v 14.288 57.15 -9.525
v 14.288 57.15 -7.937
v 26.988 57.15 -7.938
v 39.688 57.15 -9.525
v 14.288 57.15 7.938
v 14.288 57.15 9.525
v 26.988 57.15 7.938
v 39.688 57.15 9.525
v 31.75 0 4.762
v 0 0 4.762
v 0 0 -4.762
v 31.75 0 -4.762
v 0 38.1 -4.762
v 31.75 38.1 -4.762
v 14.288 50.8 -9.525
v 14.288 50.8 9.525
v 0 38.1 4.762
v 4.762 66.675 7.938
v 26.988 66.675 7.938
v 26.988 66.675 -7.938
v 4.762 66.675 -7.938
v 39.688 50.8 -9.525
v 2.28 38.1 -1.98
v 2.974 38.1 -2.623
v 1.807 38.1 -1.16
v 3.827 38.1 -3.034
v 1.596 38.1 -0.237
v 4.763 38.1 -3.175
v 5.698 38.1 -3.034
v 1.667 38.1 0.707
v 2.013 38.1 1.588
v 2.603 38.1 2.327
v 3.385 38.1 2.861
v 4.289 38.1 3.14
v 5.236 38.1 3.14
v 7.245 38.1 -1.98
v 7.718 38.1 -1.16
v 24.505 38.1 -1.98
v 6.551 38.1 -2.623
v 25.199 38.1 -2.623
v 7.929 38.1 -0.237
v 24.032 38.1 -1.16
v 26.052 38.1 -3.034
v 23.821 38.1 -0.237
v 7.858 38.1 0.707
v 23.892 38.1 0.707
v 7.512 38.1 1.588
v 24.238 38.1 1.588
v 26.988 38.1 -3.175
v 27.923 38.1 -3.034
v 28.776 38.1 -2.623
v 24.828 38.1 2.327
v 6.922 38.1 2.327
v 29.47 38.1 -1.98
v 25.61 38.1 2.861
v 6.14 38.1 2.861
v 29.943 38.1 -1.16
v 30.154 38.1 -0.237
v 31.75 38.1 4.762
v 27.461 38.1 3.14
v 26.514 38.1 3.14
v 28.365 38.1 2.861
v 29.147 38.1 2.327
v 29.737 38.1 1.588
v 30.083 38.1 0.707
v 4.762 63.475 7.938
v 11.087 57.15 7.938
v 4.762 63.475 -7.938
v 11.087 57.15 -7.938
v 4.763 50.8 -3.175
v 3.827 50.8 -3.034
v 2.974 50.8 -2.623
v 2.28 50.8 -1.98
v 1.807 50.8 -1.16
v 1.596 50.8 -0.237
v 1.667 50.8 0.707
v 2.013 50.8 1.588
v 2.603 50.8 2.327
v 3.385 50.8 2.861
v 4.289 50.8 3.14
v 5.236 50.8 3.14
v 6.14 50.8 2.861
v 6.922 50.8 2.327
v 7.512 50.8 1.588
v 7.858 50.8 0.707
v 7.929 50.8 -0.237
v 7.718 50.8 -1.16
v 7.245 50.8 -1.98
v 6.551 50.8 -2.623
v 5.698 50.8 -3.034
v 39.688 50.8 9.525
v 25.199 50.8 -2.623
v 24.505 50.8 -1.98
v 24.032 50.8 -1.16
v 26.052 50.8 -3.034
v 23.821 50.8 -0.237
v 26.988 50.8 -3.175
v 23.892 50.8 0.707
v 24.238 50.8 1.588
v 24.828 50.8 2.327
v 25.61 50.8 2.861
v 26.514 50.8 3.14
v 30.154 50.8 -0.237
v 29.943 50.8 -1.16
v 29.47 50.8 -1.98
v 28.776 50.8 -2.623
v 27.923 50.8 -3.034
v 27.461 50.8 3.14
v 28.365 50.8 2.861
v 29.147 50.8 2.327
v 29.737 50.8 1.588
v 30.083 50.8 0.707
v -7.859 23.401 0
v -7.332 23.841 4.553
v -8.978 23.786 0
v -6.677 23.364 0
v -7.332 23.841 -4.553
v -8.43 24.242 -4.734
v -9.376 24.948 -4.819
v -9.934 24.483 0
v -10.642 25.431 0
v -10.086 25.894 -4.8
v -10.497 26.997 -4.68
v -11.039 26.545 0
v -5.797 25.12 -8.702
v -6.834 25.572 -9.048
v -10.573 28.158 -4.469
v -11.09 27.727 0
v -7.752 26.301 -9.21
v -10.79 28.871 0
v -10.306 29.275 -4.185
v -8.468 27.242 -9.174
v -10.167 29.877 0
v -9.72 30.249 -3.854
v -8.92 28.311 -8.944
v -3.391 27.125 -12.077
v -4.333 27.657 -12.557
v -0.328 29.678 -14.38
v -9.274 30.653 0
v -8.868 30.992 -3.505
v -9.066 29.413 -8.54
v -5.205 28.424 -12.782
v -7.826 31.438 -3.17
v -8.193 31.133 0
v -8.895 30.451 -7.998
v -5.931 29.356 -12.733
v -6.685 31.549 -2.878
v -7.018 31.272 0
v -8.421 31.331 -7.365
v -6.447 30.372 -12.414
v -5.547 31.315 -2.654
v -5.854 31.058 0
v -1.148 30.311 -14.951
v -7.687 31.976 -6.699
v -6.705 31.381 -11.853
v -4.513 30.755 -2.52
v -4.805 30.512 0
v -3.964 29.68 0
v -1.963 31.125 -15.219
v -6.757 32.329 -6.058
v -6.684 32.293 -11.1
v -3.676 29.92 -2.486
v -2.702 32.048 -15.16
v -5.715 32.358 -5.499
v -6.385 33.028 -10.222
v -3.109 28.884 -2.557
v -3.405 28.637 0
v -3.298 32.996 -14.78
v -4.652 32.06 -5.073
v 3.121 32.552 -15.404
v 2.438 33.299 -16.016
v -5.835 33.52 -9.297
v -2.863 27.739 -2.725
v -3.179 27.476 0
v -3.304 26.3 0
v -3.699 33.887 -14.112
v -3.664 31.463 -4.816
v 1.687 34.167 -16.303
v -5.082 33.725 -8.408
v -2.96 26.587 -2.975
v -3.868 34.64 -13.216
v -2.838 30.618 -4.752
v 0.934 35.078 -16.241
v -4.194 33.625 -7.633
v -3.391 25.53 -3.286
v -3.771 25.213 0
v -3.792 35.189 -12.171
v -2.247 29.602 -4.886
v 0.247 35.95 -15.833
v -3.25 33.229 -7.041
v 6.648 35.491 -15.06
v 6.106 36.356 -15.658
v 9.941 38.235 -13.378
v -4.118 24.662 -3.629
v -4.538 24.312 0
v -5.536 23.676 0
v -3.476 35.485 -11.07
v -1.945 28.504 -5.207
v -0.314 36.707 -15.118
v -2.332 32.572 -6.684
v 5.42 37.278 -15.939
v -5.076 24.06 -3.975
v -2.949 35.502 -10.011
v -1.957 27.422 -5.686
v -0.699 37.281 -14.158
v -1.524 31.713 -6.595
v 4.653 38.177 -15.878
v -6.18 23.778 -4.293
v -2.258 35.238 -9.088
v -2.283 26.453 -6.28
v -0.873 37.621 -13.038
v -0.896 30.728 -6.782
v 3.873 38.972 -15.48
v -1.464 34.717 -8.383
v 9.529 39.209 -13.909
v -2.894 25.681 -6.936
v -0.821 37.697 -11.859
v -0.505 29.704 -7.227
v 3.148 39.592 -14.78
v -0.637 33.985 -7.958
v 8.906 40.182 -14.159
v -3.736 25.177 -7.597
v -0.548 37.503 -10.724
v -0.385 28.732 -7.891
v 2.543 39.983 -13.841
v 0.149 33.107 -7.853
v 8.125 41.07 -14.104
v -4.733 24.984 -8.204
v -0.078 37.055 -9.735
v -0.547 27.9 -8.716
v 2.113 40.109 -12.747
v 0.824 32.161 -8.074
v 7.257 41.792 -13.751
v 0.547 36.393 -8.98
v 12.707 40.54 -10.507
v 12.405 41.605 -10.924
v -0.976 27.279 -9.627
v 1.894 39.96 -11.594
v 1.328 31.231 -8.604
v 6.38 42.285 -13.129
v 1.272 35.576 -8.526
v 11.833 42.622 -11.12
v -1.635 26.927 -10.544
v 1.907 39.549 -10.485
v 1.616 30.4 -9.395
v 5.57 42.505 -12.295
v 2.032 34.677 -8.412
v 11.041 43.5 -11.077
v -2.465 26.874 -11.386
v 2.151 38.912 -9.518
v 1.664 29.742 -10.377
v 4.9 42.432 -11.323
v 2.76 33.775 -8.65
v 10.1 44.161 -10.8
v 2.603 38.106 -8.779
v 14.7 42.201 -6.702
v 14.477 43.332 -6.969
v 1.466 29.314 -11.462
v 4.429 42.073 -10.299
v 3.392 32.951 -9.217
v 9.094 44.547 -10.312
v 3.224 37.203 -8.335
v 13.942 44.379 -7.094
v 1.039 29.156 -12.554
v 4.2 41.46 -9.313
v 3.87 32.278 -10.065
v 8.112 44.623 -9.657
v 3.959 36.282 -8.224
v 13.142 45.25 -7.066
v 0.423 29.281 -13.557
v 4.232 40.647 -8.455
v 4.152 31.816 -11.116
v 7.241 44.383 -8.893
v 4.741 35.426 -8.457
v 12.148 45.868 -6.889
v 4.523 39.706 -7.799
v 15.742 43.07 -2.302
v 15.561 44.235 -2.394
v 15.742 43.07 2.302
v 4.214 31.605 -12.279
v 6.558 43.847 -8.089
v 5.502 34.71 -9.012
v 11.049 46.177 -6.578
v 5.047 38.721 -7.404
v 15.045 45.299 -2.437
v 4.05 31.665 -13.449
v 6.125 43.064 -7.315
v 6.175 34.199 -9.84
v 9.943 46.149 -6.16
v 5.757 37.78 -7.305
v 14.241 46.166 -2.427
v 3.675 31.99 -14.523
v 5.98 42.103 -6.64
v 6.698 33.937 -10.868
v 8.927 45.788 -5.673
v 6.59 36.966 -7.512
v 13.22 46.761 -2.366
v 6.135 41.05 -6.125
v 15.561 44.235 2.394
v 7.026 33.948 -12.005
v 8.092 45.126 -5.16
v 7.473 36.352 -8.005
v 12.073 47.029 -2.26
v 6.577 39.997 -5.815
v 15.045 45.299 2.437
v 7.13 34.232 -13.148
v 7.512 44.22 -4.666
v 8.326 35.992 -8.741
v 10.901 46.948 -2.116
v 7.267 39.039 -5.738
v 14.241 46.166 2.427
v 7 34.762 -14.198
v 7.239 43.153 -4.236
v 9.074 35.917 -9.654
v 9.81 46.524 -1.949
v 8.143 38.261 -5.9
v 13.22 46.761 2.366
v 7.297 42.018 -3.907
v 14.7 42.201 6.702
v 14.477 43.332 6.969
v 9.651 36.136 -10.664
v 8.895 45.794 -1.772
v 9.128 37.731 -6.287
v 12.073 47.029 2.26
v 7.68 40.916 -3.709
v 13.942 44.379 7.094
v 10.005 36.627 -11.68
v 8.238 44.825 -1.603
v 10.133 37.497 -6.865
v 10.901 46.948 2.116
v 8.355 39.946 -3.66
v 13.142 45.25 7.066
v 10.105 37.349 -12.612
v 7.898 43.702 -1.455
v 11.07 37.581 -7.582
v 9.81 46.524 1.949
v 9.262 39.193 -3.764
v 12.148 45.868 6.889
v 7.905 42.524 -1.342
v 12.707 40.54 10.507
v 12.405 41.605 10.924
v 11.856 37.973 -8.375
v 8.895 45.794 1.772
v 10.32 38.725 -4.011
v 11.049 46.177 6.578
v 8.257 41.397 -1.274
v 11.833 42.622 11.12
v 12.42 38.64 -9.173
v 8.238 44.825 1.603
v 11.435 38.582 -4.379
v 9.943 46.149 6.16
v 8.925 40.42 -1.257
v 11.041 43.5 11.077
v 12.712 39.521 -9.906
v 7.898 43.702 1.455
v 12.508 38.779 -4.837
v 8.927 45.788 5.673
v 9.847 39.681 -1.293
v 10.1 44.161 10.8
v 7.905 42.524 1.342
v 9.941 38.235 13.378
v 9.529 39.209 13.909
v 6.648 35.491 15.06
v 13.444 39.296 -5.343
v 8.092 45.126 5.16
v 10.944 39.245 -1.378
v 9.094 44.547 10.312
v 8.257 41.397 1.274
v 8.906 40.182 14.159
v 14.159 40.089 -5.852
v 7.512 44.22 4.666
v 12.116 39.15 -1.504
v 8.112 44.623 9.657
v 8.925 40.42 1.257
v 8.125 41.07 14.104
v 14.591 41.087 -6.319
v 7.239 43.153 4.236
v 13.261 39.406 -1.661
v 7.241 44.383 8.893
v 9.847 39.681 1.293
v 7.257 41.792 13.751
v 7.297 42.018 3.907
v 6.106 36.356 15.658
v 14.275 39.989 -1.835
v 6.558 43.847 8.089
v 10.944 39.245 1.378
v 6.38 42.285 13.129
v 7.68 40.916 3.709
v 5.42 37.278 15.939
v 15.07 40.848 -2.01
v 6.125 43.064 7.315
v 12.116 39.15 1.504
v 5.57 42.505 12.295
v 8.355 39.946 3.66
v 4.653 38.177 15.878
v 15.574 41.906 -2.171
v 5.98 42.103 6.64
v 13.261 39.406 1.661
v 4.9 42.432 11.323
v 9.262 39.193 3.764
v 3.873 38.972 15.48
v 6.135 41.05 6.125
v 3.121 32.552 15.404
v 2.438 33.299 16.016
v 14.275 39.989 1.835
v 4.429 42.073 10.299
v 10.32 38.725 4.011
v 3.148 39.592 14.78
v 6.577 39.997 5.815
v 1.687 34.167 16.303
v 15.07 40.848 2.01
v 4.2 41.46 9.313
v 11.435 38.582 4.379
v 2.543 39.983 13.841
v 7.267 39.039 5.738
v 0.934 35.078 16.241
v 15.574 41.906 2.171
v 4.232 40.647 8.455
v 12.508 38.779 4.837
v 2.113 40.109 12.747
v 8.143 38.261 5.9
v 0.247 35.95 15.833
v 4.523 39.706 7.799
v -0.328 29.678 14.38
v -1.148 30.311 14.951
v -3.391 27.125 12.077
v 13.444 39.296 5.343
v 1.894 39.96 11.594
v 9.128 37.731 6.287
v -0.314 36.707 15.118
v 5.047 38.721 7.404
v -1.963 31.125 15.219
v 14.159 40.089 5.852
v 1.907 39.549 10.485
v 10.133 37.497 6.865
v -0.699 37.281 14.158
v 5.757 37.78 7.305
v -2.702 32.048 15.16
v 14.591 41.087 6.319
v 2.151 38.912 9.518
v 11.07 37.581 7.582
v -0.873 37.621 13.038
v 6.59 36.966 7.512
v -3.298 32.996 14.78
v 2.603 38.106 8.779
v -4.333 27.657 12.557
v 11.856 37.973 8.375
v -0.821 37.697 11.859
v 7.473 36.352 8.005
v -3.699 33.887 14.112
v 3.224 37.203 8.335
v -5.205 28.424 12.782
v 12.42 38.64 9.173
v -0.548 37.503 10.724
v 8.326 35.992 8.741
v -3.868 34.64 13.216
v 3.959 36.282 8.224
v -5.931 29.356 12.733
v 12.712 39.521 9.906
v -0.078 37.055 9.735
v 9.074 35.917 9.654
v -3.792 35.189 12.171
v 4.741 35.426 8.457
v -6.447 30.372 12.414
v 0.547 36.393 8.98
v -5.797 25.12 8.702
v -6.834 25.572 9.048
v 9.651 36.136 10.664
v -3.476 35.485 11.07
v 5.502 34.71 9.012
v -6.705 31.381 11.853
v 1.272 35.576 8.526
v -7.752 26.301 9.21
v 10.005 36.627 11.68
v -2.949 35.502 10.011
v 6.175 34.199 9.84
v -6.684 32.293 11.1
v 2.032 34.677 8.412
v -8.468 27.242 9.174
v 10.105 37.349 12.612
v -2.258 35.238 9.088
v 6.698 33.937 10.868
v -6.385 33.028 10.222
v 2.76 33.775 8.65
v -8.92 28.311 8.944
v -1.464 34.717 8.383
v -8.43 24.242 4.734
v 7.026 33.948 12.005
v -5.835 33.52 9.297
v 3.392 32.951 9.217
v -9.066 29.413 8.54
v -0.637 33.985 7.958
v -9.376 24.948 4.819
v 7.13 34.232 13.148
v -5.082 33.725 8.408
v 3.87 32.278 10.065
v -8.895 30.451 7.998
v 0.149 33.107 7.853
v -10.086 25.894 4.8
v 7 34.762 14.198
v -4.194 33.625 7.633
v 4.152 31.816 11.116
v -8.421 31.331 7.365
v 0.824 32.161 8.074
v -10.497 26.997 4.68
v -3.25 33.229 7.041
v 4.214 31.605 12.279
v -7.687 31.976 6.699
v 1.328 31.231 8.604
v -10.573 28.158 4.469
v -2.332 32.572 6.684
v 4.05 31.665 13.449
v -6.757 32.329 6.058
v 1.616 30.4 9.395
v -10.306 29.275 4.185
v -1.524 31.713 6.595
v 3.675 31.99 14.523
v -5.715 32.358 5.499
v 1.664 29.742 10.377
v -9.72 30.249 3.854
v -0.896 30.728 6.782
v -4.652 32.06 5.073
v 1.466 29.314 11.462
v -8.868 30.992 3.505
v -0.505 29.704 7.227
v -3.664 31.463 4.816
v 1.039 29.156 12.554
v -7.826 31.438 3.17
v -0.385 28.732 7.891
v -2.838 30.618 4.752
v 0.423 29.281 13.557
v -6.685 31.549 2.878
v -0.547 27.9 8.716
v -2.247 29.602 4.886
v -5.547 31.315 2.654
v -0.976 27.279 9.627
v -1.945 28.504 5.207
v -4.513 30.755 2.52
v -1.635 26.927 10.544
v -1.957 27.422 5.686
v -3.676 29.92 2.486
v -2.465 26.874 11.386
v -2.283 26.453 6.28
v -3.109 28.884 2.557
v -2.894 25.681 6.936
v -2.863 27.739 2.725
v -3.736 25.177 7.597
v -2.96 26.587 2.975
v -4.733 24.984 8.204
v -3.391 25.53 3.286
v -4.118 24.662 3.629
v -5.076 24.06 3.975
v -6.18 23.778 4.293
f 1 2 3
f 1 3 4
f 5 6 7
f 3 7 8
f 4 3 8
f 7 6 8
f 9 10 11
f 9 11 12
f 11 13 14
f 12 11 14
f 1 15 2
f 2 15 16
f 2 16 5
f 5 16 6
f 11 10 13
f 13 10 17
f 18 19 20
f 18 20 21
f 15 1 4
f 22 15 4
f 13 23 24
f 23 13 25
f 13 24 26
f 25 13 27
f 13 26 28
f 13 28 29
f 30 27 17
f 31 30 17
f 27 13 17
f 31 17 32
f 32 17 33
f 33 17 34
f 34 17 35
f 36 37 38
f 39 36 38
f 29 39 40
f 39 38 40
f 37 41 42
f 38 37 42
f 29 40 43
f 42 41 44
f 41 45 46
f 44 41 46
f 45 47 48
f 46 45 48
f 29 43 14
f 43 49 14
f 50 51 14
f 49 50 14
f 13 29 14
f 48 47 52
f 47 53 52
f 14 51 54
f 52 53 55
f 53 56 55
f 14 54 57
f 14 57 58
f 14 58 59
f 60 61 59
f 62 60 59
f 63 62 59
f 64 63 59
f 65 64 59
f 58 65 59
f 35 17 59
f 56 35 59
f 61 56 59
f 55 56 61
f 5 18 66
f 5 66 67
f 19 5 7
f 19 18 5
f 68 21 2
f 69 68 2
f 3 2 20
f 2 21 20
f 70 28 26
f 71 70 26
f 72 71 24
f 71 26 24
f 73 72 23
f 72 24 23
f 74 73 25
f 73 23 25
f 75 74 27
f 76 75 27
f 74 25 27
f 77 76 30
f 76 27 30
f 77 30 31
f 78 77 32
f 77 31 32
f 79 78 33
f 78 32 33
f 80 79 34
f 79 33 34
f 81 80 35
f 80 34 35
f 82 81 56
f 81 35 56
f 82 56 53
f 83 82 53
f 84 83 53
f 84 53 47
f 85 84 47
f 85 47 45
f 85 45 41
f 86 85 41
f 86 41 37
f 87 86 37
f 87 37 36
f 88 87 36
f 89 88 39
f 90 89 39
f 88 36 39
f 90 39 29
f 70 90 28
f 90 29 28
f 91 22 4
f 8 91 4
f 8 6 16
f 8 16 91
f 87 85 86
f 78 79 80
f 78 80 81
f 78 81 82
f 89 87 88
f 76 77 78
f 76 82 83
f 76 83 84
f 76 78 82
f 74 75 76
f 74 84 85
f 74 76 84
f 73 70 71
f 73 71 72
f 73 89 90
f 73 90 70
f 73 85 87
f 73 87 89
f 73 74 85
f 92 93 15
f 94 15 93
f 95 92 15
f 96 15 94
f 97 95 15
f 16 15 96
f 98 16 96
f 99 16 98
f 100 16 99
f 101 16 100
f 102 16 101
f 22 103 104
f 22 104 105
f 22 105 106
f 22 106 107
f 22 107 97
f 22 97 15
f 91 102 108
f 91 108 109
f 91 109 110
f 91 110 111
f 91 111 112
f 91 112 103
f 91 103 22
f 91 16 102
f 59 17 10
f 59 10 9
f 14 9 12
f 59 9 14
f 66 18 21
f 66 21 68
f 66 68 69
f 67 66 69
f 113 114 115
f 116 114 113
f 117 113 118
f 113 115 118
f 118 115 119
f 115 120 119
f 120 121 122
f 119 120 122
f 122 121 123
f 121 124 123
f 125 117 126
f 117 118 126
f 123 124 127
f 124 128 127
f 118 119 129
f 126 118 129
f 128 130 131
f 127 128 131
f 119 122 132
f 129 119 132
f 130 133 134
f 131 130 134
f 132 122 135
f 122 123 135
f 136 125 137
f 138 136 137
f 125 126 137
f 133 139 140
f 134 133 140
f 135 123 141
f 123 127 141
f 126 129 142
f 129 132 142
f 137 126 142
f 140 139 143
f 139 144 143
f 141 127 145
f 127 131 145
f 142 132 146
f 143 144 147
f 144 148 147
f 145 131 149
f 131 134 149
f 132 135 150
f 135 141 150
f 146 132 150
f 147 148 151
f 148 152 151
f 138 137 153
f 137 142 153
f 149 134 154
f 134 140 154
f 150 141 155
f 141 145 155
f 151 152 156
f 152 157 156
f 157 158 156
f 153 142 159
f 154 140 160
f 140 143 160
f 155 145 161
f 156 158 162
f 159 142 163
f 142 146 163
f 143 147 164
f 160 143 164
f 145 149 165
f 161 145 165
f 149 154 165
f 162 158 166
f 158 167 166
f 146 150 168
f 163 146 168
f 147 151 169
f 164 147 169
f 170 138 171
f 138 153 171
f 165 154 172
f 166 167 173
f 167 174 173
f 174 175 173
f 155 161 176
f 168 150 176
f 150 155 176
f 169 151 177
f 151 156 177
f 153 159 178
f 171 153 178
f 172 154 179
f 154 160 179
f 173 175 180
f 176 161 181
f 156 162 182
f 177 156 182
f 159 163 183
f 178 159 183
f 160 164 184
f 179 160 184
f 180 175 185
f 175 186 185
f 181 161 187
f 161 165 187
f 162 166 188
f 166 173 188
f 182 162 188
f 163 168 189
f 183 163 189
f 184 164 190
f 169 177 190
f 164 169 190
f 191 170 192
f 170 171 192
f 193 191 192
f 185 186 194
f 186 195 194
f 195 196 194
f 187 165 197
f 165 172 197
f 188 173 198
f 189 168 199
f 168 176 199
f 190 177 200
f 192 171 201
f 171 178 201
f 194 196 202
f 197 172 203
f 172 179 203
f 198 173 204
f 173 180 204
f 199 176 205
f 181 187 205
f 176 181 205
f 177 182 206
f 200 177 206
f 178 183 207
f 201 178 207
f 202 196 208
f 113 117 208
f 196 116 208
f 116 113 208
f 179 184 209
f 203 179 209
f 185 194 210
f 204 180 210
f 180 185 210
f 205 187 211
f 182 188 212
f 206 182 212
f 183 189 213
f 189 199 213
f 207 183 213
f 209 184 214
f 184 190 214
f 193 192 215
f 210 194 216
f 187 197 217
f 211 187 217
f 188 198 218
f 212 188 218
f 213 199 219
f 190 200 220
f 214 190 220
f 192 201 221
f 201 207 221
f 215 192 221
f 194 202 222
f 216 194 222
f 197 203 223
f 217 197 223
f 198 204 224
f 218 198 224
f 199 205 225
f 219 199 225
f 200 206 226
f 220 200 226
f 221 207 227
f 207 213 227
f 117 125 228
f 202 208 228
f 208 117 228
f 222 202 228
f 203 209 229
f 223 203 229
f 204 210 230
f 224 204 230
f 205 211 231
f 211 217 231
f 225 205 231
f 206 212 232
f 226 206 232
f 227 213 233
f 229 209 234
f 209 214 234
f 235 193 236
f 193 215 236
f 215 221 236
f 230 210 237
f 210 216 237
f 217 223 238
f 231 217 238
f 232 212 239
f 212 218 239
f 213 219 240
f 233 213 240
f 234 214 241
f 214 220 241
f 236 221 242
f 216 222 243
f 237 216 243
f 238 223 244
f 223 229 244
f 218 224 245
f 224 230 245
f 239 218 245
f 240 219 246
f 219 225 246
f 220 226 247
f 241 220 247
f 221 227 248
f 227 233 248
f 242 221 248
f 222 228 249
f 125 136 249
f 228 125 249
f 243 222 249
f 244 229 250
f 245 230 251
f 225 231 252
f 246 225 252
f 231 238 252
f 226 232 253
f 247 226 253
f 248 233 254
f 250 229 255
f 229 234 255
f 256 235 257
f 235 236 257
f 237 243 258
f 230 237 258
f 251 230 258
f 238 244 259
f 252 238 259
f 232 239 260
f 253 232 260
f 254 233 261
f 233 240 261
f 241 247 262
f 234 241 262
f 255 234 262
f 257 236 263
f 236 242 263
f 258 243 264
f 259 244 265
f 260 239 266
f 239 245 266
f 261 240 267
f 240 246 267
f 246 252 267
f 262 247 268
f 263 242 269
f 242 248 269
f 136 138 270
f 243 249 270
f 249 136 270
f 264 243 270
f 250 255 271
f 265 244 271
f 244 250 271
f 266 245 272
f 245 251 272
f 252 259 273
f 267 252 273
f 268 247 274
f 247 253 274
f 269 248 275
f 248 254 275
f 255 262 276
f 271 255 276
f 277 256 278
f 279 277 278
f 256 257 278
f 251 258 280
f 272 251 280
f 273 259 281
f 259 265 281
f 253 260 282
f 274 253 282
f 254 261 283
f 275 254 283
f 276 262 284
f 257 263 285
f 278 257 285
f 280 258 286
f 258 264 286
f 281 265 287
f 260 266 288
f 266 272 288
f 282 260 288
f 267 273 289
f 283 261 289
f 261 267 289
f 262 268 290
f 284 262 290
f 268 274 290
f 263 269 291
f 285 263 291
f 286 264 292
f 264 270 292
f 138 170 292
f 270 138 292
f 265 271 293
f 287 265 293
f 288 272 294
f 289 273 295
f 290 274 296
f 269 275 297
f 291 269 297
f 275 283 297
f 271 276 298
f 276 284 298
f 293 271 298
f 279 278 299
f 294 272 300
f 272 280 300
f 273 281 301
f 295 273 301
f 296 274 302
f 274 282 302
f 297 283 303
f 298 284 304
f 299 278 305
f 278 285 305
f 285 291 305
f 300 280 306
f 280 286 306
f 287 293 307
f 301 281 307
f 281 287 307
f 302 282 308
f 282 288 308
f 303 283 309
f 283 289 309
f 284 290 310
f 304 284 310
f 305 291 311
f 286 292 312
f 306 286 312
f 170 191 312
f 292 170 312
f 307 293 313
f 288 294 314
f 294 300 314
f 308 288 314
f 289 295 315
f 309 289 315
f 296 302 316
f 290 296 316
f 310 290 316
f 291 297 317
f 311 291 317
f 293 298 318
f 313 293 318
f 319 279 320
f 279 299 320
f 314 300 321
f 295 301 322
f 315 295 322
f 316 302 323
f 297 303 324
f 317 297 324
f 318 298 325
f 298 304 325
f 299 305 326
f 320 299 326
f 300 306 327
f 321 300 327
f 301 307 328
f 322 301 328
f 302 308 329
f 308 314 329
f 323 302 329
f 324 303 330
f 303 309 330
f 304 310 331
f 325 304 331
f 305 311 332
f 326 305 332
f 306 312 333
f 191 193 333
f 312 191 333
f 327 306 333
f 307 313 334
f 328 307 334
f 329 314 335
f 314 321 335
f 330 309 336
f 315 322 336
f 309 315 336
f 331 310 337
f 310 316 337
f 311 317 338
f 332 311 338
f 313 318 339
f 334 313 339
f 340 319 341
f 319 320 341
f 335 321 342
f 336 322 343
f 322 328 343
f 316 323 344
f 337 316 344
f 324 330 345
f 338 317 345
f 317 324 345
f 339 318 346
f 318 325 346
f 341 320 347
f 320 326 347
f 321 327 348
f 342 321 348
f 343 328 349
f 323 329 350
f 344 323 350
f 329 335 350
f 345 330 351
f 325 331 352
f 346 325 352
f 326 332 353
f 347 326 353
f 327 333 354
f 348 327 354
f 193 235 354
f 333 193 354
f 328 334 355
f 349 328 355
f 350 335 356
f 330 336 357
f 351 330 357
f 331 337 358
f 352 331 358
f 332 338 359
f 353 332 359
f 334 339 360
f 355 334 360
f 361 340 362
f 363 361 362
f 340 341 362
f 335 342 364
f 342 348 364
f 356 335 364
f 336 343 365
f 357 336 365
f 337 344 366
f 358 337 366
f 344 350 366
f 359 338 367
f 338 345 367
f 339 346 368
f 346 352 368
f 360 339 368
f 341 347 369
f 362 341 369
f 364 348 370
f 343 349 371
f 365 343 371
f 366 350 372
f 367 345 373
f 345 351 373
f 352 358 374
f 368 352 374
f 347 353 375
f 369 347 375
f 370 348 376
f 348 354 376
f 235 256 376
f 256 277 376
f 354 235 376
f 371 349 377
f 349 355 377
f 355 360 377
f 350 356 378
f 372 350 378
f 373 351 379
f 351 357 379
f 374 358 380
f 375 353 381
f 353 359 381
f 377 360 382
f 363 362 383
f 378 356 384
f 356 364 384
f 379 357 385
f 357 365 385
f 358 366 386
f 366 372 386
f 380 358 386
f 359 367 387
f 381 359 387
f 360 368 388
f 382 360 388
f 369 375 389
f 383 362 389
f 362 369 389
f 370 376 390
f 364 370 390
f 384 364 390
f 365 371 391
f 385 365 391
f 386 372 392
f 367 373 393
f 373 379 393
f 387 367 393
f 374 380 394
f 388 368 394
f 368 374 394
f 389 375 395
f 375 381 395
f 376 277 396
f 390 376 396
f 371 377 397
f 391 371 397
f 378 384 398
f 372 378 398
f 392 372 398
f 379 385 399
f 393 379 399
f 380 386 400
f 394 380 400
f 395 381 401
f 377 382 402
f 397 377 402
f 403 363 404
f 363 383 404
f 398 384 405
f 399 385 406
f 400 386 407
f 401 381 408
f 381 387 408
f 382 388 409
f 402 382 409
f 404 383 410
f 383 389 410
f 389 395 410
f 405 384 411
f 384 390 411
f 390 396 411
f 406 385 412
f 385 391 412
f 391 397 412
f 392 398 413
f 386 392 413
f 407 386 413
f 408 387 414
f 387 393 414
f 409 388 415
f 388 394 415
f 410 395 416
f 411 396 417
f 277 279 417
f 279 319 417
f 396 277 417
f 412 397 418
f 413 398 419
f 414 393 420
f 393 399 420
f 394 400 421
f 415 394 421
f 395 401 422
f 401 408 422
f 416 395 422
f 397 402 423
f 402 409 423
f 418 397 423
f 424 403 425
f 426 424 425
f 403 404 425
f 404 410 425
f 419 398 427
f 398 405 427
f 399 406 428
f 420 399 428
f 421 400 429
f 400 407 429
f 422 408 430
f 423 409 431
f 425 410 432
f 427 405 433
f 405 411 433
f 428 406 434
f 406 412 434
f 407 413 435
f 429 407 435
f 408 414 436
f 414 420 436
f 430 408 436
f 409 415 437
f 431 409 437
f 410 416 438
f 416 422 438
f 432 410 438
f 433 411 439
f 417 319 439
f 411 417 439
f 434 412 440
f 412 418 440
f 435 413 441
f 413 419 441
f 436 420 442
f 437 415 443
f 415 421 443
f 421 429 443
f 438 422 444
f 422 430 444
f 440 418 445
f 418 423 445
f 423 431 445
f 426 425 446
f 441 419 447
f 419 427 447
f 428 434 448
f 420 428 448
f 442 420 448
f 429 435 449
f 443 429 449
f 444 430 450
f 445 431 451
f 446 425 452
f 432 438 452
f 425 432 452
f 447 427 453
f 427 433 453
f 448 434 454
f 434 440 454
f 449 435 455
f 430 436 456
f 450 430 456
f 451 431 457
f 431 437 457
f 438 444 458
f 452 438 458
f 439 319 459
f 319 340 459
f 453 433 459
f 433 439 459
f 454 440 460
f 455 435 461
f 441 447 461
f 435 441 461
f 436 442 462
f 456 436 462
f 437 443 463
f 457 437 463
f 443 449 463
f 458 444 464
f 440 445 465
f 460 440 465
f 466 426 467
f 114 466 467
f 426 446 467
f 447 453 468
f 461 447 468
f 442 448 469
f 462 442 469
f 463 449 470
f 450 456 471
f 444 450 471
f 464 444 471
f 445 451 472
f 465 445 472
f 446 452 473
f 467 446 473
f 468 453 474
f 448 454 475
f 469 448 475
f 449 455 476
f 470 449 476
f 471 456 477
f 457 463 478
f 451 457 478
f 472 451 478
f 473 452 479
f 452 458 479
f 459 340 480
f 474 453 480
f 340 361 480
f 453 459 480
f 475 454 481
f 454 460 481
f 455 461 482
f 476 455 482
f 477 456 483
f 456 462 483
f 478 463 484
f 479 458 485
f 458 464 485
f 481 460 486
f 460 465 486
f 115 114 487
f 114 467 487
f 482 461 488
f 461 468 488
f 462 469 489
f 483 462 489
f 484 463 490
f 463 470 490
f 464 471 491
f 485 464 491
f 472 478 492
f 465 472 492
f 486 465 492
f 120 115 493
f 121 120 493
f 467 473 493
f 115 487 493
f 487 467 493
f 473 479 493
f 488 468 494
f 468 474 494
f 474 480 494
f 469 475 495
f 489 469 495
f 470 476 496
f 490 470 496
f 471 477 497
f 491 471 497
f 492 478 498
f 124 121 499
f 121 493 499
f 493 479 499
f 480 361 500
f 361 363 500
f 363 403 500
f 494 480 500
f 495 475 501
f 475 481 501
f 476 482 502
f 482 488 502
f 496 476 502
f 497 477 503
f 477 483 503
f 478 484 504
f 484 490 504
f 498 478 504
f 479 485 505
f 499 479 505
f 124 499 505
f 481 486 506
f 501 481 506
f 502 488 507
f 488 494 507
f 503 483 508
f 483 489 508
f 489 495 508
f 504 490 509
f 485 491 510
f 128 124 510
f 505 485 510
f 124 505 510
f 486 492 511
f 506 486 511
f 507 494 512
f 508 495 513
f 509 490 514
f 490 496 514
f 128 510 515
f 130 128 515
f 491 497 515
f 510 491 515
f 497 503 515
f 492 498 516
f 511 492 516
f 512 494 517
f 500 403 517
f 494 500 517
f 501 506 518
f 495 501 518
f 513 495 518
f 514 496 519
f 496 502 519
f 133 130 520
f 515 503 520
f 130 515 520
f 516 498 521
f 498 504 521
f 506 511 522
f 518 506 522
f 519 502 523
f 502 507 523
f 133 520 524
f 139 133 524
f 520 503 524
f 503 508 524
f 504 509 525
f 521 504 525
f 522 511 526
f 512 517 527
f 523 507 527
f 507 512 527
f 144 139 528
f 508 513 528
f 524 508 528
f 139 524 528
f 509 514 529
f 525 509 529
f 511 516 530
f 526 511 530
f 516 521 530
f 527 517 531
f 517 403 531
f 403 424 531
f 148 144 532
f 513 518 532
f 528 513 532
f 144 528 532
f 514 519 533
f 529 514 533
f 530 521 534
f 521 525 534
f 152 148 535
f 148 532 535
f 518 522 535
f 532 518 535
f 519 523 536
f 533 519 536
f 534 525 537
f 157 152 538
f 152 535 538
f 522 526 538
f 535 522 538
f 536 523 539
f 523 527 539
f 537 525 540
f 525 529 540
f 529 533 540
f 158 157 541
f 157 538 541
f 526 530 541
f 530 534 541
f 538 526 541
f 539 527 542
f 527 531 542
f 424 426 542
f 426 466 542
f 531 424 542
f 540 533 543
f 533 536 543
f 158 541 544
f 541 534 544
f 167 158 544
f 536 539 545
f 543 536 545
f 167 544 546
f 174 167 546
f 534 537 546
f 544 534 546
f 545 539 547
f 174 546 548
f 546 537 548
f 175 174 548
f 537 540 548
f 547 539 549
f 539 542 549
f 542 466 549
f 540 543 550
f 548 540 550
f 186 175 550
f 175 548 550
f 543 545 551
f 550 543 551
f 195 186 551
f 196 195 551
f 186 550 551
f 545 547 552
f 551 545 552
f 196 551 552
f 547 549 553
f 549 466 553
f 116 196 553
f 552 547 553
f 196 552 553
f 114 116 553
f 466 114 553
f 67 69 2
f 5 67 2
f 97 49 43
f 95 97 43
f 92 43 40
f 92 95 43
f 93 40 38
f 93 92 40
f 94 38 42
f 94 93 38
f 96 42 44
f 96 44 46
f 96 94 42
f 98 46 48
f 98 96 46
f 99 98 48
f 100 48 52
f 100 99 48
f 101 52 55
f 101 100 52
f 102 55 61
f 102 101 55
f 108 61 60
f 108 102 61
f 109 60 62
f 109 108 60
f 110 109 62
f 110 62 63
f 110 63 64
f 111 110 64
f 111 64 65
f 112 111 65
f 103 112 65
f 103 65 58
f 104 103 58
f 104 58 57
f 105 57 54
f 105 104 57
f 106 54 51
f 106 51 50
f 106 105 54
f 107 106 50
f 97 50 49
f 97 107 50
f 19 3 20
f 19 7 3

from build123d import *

# Parameters (mm, degrees)
SKETCH1_W           = 31.75
SKETCH1_H           = 38.1
BOSS_EXTRUDE1_DEPTH = 4.7625
SKETCH2_R           = 3.175
BOSS_EXTRUDE2_DEPTH = 12.7
SKETCH3_W           = 25.4
SKETCH3_H           = 6.35
BOSS_EXTRUDE3_DEPTH = 9.525
BOSS_EXTRUDE4_DEPTH = 7.9375
SKETCH5_R           = 3.96875


with BuildPart() as part:
    # Sketch1 → Boss-Extrude1 (new, symmetric)
    with BuildSketch(Plane.XY):
        with Locations((15.875, 19.05)):
            Rectangle(SKETCH1_W, SKETCH1_H)
    extrude(amount=BOSS_EXTRUDE1_DEPTH, both=True)

    # Sketch2 → Boss-Extrude2 (add, symmetric)
    with BuildSketch(Plane(origin=(0, 38.1, 0), x_dir=(1, 0, 0), z_dir=(0, 1, 0))):
        with Locations(Location((4.7625, 0, 0), (0, 0, 90))):
            Circle(SKETCH2_R)
        with Locations(Location((26.9875, 0, 0), (0, 0, 90))):
            Circle(SKETCH2_R)
    extrude(amount=BOSS_EXTRUDE2_DEPTH, both=True)

    # Sketch3 → Boss-Extrude3 (add, symmetric)
    with BuildSketch(Plane.XY):
        with Locations((26.9875, 53.975)):
            Rectangle(SKETCH3_W, SKETCH3_H)
    extrude(amount=BOSS_EXTRUDE3_DEPTH, both=True)

    # Sketch4 → Boss-Extrude4 (add, symmetric)
    with BuildSketch(Plane.XY):
        Polygon((26.9875, 57.15), (26.9875, 66.675), (4.7625, 66.675), (4.7625, 63.4746), (11.0871, 57.15), align=None)
    extrude(amount=BOSS_EXTRUDE4_DEPTH, both=True)


with BuildPart() as body_2:
    # Sketch5 → Revolve1 (revolve)
    with BuildSketch(Plane.XY, mode=Mode.PRIVATE) as revolve1_sk:
        with Locations((11.90625, 43.18)):
            Circle(SKETCH5_R)
    revolve(revolve1_sk.sketch.rotate(Axis((0, 38.1, 0), (0.6401843996644798, -0.768221279597376, 0)), 180), axis=Axis((0, 38.1, 0), (0.6401843996644798, -0.768221279597376, 0)))


solid = Compound([part.part, body_2.part])
